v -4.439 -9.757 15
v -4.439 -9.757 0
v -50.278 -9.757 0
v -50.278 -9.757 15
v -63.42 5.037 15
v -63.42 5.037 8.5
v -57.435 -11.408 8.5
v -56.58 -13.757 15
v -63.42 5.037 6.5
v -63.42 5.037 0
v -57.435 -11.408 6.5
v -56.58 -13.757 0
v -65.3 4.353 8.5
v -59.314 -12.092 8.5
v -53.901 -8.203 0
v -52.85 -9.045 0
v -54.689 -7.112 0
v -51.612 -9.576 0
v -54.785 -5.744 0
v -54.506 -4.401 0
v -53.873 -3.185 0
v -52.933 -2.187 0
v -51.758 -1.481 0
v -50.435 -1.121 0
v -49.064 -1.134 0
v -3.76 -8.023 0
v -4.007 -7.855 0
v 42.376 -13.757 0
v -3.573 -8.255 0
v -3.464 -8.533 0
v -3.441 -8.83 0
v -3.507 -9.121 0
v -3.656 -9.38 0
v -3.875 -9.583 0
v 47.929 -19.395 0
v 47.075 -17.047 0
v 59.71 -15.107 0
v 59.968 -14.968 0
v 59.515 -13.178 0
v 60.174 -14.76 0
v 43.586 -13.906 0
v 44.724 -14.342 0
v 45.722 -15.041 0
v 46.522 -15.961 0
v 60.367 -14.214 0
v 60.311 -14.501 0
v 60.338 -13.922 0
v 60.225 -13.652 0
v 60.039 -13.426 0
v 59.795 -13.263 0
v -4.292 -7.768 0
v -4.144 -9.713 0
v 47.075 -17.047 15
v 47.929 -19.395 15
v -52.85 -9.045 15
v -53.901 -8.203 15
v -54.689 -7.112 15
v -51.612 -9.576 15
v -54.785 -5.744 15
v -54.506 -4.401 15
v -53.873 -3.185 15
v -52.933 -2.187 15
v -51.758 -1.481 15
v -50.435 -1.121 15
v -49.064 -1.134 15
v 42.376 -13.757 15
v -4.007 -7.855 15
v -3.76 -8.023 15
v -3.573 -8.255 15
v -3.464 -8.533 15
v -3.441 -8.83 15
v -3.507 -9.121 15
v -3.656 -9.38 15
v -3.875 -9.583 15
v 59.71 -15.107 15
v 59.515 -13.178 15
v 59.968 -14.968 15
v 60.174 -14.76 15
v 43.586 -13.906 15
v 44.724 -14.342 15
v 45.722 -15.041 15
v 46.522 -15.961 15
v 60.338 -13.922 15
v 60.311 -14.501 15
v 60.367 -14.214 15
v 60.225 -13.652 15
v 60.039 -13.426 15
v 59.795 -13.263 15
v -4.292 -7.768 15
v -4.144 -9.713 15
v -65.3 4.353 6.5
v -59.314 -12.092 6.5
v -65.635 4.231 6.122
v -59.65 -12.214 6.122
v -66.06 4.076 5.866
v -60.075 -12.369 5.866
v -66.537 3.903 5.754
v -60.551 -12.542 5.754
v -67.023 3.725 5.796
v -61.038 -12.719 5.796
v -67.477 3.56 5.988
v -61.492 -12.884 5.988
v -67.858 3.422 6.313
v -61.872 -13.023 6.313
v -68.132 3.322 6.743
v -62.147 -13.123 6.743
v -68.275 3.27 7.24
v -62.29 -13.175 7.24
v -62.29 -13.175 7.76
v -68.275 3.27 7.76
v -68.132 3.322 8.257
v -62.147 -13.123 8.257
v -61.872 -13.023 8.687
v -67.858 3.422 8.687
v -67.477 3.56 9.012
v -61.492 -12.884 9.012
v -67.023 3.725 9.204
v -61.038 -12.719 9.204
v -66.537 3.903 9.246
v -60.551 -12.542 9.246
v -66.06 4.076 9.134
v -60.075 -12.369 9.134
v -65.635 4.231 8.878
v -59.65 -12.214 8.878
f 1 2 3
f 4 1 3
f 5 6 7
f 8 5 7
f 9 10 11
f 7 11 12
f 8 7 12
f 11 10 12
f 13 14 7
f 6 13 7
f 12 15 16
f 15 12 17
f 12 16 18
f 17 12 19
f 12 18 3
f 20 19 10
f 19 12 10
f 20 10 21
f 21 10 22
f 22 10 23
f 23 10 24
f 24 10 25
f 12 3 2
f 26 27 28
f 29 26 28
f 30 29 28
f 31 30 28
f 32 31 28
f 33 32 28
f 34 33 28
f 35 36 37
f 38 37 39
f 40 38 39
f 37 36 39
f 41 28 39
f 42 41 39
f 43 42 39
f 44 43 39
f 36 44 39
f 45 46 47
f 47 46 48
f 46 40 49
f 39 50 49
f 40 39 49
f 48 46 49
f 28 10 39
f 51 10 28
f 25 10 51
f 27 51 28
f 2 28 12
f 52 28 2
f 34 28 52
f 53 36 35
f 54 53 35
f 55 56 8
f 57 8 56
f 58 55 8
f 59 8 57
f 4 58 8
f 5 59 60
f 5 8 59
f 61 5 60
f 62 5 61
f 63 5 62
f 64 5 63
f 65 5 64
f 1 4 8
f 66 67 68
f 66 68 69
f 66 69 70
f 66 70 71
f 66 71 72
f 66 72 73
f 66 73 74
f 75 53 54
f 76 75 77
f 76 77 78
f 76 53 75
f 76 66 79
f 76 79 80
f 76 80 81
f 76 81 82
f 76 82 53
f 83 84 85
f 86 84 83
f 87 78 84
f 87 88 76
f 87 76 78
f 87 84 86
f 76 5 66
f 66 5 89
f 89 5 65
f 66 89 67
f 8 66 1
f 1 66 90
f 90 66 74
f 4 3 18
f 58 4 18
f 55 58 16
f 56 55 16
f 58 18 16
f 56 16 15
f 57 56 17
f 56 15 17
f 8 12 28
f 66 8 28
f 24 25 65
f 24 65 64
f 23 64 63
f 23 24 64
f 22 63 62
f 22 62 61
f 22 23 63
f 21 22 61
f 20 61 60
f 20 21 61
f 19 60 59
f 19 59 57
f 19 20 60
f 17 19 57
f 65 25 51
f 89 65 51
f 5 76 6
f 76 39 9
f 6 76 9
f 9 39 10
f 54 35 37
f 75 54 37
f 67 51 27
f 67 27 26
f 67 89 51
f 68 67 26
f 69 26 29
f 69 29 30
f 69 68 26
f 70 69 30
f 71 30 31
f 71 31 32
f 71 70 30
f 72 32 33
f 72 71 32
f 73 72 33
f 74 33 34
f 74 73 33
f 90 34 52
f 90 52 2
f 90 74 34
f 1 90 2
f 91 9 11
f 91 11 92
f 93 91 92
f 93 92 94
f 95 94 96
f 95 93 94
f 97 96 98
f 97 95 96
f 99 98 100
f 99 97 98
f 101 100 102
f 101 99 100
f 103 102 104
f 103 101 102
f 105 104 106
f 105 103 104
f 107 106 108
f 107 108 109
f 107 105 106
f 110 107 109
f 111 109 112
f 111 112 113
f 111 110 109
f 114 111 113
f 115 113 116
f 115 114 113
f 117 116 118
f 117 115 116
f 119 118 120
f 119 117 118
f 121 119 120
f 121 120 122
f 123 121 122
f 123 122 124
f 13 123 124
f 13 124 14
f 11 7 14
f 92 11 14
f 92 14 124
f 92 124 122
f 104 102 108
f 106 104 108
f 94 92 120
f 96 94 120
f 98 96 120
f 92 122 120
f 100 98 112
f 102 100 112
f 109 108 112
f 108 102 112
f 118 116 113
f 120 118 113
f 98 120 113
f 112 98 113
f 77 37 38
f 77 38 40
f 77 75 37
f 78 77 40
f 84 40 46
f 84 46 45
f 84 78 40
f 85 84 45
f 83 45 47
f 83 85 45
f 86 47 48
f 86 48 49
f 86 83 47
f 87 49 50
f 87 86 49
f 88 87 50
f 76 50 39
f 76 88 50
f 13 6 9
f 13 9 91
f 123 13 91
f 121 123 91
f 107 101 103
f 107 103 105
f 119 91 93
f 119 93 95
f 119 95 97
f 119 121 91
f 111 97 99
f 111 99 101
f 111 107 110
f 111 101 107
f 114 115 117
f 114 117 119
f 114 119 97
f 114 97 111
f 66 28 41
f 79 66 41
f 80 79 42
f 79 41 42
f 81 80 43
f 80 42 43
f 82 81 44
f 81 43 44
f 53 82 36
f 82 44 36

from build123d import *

# Parameters (mm, degrees)
F1_DEPTH    = 15
F2_T1_DEPTH = 15
F3_R        = 1
F6_DEPTH    = 17.5


# Not quite as in the source:
# - a fillet or chamfer that OpenCascade refuses, or shapes differently, is made with other operations: its cross-section is extruded or revolved along the edge and cut away or added


with BuildPart() as f1:
    # F0 (on Top) → F1 (new body)
    with BuildSketch(Plane.XY):
        Polygon((-63.4202014333, 5.036846236), (-56.5797985667, -13.7570061798), (45.8773750323, -13.7570061798), (63.4202014333, -13.7570061798), align=None)
        Polygon((-57.3651718984, 0.0960069154), (9.1331767526, -9.7570061798), (-53.7789684139, -9.7570061798), align=None, mode=Mode.SUBTRACT)
        Polygon((63.4202014333, -13.7570061798), (45.8773750323, -13.7570061798), (47.9294958922, -19.3951619045), align=None)
    extrude(amount=F1_DEPTH)

    # F2: fillet of radius 5 on 3 edges, made by hand

    # F2_s2 → F2_t1 (join)
    with BuildSketch(Plane.XY):
        with BuildLine():
            ThreePointArc((42.3763373412, -13.7570061798), (45.244219523, -14.6612459583), (47.0748004452, -17.0469054631))
            Line((47.0748004452, -17.0469054631), (45.8773750323, -13.7570061798))
            Line((45.8773750323, -13.7570061798), (42.3763373412, -13.7570061798))
        make_face()
        with BuildLine():
            ThreePointArc((-50.2779307229, -9.7570061798), (-53.1458129046, -8.8527664012), (-54.9763938268, -6.4671068964))
            Line((-54.9763938268, -6.4671068964), (-53.7789684139, -9.7570061798))
            Line((-53.7789684139, -9.7570061798), (-50.2779307229, -9.7570061798))
        make_face()
        with BuildLine():
            ThreePointArc((-49.0635393533, -1.1340400833), (-53.6703308808, -2.9189438256), (-54.4948480837, -7.790142952))
            Line((-54.4948480837, -7.790142952), (-57.3651718984, 0.0960069154))
            Line((-57.3651718984, 0.0960069154), (-49.0635393533, -1.1340400833))
        make_face()
    extrude(amount=F2_T1_DEPTH)

    # F3
    f3_edges = [f1.edges().sort_by_distance(p)[0] for p in [
        (63.420201, -13.757006, 7.5),
        (9.133177, -9.757006, 7.5),
    ]]
    fillet(f3_edges, radius=F3_R)

    # F5 (on face) → F6 (join)
    with BuildSketch(Plane(origin=(-9.0375654481, 24.8305069955, 0), x_dir=(-0.9396926208, -0.3420201433, 0), z_dir=(-0.3420201433, 0.9396926208, 0))):
        with BuildLine():
            Line((57.8727924241, 8.5), (57.8727924241, 6.5))
            Line((57.8727924241, 6.5), (59.8727924241, 6.5))
            ThreePointArc((59.8727924241, 6.5), (63.0589330857, 7.5), (59.8727924241, 8.5))
            Line((59.8727924241, 8.5), (57.8727924241, 8.5))
        make_face()
    extrude(amount=-F6_DEPTH)


solid = f1.part
